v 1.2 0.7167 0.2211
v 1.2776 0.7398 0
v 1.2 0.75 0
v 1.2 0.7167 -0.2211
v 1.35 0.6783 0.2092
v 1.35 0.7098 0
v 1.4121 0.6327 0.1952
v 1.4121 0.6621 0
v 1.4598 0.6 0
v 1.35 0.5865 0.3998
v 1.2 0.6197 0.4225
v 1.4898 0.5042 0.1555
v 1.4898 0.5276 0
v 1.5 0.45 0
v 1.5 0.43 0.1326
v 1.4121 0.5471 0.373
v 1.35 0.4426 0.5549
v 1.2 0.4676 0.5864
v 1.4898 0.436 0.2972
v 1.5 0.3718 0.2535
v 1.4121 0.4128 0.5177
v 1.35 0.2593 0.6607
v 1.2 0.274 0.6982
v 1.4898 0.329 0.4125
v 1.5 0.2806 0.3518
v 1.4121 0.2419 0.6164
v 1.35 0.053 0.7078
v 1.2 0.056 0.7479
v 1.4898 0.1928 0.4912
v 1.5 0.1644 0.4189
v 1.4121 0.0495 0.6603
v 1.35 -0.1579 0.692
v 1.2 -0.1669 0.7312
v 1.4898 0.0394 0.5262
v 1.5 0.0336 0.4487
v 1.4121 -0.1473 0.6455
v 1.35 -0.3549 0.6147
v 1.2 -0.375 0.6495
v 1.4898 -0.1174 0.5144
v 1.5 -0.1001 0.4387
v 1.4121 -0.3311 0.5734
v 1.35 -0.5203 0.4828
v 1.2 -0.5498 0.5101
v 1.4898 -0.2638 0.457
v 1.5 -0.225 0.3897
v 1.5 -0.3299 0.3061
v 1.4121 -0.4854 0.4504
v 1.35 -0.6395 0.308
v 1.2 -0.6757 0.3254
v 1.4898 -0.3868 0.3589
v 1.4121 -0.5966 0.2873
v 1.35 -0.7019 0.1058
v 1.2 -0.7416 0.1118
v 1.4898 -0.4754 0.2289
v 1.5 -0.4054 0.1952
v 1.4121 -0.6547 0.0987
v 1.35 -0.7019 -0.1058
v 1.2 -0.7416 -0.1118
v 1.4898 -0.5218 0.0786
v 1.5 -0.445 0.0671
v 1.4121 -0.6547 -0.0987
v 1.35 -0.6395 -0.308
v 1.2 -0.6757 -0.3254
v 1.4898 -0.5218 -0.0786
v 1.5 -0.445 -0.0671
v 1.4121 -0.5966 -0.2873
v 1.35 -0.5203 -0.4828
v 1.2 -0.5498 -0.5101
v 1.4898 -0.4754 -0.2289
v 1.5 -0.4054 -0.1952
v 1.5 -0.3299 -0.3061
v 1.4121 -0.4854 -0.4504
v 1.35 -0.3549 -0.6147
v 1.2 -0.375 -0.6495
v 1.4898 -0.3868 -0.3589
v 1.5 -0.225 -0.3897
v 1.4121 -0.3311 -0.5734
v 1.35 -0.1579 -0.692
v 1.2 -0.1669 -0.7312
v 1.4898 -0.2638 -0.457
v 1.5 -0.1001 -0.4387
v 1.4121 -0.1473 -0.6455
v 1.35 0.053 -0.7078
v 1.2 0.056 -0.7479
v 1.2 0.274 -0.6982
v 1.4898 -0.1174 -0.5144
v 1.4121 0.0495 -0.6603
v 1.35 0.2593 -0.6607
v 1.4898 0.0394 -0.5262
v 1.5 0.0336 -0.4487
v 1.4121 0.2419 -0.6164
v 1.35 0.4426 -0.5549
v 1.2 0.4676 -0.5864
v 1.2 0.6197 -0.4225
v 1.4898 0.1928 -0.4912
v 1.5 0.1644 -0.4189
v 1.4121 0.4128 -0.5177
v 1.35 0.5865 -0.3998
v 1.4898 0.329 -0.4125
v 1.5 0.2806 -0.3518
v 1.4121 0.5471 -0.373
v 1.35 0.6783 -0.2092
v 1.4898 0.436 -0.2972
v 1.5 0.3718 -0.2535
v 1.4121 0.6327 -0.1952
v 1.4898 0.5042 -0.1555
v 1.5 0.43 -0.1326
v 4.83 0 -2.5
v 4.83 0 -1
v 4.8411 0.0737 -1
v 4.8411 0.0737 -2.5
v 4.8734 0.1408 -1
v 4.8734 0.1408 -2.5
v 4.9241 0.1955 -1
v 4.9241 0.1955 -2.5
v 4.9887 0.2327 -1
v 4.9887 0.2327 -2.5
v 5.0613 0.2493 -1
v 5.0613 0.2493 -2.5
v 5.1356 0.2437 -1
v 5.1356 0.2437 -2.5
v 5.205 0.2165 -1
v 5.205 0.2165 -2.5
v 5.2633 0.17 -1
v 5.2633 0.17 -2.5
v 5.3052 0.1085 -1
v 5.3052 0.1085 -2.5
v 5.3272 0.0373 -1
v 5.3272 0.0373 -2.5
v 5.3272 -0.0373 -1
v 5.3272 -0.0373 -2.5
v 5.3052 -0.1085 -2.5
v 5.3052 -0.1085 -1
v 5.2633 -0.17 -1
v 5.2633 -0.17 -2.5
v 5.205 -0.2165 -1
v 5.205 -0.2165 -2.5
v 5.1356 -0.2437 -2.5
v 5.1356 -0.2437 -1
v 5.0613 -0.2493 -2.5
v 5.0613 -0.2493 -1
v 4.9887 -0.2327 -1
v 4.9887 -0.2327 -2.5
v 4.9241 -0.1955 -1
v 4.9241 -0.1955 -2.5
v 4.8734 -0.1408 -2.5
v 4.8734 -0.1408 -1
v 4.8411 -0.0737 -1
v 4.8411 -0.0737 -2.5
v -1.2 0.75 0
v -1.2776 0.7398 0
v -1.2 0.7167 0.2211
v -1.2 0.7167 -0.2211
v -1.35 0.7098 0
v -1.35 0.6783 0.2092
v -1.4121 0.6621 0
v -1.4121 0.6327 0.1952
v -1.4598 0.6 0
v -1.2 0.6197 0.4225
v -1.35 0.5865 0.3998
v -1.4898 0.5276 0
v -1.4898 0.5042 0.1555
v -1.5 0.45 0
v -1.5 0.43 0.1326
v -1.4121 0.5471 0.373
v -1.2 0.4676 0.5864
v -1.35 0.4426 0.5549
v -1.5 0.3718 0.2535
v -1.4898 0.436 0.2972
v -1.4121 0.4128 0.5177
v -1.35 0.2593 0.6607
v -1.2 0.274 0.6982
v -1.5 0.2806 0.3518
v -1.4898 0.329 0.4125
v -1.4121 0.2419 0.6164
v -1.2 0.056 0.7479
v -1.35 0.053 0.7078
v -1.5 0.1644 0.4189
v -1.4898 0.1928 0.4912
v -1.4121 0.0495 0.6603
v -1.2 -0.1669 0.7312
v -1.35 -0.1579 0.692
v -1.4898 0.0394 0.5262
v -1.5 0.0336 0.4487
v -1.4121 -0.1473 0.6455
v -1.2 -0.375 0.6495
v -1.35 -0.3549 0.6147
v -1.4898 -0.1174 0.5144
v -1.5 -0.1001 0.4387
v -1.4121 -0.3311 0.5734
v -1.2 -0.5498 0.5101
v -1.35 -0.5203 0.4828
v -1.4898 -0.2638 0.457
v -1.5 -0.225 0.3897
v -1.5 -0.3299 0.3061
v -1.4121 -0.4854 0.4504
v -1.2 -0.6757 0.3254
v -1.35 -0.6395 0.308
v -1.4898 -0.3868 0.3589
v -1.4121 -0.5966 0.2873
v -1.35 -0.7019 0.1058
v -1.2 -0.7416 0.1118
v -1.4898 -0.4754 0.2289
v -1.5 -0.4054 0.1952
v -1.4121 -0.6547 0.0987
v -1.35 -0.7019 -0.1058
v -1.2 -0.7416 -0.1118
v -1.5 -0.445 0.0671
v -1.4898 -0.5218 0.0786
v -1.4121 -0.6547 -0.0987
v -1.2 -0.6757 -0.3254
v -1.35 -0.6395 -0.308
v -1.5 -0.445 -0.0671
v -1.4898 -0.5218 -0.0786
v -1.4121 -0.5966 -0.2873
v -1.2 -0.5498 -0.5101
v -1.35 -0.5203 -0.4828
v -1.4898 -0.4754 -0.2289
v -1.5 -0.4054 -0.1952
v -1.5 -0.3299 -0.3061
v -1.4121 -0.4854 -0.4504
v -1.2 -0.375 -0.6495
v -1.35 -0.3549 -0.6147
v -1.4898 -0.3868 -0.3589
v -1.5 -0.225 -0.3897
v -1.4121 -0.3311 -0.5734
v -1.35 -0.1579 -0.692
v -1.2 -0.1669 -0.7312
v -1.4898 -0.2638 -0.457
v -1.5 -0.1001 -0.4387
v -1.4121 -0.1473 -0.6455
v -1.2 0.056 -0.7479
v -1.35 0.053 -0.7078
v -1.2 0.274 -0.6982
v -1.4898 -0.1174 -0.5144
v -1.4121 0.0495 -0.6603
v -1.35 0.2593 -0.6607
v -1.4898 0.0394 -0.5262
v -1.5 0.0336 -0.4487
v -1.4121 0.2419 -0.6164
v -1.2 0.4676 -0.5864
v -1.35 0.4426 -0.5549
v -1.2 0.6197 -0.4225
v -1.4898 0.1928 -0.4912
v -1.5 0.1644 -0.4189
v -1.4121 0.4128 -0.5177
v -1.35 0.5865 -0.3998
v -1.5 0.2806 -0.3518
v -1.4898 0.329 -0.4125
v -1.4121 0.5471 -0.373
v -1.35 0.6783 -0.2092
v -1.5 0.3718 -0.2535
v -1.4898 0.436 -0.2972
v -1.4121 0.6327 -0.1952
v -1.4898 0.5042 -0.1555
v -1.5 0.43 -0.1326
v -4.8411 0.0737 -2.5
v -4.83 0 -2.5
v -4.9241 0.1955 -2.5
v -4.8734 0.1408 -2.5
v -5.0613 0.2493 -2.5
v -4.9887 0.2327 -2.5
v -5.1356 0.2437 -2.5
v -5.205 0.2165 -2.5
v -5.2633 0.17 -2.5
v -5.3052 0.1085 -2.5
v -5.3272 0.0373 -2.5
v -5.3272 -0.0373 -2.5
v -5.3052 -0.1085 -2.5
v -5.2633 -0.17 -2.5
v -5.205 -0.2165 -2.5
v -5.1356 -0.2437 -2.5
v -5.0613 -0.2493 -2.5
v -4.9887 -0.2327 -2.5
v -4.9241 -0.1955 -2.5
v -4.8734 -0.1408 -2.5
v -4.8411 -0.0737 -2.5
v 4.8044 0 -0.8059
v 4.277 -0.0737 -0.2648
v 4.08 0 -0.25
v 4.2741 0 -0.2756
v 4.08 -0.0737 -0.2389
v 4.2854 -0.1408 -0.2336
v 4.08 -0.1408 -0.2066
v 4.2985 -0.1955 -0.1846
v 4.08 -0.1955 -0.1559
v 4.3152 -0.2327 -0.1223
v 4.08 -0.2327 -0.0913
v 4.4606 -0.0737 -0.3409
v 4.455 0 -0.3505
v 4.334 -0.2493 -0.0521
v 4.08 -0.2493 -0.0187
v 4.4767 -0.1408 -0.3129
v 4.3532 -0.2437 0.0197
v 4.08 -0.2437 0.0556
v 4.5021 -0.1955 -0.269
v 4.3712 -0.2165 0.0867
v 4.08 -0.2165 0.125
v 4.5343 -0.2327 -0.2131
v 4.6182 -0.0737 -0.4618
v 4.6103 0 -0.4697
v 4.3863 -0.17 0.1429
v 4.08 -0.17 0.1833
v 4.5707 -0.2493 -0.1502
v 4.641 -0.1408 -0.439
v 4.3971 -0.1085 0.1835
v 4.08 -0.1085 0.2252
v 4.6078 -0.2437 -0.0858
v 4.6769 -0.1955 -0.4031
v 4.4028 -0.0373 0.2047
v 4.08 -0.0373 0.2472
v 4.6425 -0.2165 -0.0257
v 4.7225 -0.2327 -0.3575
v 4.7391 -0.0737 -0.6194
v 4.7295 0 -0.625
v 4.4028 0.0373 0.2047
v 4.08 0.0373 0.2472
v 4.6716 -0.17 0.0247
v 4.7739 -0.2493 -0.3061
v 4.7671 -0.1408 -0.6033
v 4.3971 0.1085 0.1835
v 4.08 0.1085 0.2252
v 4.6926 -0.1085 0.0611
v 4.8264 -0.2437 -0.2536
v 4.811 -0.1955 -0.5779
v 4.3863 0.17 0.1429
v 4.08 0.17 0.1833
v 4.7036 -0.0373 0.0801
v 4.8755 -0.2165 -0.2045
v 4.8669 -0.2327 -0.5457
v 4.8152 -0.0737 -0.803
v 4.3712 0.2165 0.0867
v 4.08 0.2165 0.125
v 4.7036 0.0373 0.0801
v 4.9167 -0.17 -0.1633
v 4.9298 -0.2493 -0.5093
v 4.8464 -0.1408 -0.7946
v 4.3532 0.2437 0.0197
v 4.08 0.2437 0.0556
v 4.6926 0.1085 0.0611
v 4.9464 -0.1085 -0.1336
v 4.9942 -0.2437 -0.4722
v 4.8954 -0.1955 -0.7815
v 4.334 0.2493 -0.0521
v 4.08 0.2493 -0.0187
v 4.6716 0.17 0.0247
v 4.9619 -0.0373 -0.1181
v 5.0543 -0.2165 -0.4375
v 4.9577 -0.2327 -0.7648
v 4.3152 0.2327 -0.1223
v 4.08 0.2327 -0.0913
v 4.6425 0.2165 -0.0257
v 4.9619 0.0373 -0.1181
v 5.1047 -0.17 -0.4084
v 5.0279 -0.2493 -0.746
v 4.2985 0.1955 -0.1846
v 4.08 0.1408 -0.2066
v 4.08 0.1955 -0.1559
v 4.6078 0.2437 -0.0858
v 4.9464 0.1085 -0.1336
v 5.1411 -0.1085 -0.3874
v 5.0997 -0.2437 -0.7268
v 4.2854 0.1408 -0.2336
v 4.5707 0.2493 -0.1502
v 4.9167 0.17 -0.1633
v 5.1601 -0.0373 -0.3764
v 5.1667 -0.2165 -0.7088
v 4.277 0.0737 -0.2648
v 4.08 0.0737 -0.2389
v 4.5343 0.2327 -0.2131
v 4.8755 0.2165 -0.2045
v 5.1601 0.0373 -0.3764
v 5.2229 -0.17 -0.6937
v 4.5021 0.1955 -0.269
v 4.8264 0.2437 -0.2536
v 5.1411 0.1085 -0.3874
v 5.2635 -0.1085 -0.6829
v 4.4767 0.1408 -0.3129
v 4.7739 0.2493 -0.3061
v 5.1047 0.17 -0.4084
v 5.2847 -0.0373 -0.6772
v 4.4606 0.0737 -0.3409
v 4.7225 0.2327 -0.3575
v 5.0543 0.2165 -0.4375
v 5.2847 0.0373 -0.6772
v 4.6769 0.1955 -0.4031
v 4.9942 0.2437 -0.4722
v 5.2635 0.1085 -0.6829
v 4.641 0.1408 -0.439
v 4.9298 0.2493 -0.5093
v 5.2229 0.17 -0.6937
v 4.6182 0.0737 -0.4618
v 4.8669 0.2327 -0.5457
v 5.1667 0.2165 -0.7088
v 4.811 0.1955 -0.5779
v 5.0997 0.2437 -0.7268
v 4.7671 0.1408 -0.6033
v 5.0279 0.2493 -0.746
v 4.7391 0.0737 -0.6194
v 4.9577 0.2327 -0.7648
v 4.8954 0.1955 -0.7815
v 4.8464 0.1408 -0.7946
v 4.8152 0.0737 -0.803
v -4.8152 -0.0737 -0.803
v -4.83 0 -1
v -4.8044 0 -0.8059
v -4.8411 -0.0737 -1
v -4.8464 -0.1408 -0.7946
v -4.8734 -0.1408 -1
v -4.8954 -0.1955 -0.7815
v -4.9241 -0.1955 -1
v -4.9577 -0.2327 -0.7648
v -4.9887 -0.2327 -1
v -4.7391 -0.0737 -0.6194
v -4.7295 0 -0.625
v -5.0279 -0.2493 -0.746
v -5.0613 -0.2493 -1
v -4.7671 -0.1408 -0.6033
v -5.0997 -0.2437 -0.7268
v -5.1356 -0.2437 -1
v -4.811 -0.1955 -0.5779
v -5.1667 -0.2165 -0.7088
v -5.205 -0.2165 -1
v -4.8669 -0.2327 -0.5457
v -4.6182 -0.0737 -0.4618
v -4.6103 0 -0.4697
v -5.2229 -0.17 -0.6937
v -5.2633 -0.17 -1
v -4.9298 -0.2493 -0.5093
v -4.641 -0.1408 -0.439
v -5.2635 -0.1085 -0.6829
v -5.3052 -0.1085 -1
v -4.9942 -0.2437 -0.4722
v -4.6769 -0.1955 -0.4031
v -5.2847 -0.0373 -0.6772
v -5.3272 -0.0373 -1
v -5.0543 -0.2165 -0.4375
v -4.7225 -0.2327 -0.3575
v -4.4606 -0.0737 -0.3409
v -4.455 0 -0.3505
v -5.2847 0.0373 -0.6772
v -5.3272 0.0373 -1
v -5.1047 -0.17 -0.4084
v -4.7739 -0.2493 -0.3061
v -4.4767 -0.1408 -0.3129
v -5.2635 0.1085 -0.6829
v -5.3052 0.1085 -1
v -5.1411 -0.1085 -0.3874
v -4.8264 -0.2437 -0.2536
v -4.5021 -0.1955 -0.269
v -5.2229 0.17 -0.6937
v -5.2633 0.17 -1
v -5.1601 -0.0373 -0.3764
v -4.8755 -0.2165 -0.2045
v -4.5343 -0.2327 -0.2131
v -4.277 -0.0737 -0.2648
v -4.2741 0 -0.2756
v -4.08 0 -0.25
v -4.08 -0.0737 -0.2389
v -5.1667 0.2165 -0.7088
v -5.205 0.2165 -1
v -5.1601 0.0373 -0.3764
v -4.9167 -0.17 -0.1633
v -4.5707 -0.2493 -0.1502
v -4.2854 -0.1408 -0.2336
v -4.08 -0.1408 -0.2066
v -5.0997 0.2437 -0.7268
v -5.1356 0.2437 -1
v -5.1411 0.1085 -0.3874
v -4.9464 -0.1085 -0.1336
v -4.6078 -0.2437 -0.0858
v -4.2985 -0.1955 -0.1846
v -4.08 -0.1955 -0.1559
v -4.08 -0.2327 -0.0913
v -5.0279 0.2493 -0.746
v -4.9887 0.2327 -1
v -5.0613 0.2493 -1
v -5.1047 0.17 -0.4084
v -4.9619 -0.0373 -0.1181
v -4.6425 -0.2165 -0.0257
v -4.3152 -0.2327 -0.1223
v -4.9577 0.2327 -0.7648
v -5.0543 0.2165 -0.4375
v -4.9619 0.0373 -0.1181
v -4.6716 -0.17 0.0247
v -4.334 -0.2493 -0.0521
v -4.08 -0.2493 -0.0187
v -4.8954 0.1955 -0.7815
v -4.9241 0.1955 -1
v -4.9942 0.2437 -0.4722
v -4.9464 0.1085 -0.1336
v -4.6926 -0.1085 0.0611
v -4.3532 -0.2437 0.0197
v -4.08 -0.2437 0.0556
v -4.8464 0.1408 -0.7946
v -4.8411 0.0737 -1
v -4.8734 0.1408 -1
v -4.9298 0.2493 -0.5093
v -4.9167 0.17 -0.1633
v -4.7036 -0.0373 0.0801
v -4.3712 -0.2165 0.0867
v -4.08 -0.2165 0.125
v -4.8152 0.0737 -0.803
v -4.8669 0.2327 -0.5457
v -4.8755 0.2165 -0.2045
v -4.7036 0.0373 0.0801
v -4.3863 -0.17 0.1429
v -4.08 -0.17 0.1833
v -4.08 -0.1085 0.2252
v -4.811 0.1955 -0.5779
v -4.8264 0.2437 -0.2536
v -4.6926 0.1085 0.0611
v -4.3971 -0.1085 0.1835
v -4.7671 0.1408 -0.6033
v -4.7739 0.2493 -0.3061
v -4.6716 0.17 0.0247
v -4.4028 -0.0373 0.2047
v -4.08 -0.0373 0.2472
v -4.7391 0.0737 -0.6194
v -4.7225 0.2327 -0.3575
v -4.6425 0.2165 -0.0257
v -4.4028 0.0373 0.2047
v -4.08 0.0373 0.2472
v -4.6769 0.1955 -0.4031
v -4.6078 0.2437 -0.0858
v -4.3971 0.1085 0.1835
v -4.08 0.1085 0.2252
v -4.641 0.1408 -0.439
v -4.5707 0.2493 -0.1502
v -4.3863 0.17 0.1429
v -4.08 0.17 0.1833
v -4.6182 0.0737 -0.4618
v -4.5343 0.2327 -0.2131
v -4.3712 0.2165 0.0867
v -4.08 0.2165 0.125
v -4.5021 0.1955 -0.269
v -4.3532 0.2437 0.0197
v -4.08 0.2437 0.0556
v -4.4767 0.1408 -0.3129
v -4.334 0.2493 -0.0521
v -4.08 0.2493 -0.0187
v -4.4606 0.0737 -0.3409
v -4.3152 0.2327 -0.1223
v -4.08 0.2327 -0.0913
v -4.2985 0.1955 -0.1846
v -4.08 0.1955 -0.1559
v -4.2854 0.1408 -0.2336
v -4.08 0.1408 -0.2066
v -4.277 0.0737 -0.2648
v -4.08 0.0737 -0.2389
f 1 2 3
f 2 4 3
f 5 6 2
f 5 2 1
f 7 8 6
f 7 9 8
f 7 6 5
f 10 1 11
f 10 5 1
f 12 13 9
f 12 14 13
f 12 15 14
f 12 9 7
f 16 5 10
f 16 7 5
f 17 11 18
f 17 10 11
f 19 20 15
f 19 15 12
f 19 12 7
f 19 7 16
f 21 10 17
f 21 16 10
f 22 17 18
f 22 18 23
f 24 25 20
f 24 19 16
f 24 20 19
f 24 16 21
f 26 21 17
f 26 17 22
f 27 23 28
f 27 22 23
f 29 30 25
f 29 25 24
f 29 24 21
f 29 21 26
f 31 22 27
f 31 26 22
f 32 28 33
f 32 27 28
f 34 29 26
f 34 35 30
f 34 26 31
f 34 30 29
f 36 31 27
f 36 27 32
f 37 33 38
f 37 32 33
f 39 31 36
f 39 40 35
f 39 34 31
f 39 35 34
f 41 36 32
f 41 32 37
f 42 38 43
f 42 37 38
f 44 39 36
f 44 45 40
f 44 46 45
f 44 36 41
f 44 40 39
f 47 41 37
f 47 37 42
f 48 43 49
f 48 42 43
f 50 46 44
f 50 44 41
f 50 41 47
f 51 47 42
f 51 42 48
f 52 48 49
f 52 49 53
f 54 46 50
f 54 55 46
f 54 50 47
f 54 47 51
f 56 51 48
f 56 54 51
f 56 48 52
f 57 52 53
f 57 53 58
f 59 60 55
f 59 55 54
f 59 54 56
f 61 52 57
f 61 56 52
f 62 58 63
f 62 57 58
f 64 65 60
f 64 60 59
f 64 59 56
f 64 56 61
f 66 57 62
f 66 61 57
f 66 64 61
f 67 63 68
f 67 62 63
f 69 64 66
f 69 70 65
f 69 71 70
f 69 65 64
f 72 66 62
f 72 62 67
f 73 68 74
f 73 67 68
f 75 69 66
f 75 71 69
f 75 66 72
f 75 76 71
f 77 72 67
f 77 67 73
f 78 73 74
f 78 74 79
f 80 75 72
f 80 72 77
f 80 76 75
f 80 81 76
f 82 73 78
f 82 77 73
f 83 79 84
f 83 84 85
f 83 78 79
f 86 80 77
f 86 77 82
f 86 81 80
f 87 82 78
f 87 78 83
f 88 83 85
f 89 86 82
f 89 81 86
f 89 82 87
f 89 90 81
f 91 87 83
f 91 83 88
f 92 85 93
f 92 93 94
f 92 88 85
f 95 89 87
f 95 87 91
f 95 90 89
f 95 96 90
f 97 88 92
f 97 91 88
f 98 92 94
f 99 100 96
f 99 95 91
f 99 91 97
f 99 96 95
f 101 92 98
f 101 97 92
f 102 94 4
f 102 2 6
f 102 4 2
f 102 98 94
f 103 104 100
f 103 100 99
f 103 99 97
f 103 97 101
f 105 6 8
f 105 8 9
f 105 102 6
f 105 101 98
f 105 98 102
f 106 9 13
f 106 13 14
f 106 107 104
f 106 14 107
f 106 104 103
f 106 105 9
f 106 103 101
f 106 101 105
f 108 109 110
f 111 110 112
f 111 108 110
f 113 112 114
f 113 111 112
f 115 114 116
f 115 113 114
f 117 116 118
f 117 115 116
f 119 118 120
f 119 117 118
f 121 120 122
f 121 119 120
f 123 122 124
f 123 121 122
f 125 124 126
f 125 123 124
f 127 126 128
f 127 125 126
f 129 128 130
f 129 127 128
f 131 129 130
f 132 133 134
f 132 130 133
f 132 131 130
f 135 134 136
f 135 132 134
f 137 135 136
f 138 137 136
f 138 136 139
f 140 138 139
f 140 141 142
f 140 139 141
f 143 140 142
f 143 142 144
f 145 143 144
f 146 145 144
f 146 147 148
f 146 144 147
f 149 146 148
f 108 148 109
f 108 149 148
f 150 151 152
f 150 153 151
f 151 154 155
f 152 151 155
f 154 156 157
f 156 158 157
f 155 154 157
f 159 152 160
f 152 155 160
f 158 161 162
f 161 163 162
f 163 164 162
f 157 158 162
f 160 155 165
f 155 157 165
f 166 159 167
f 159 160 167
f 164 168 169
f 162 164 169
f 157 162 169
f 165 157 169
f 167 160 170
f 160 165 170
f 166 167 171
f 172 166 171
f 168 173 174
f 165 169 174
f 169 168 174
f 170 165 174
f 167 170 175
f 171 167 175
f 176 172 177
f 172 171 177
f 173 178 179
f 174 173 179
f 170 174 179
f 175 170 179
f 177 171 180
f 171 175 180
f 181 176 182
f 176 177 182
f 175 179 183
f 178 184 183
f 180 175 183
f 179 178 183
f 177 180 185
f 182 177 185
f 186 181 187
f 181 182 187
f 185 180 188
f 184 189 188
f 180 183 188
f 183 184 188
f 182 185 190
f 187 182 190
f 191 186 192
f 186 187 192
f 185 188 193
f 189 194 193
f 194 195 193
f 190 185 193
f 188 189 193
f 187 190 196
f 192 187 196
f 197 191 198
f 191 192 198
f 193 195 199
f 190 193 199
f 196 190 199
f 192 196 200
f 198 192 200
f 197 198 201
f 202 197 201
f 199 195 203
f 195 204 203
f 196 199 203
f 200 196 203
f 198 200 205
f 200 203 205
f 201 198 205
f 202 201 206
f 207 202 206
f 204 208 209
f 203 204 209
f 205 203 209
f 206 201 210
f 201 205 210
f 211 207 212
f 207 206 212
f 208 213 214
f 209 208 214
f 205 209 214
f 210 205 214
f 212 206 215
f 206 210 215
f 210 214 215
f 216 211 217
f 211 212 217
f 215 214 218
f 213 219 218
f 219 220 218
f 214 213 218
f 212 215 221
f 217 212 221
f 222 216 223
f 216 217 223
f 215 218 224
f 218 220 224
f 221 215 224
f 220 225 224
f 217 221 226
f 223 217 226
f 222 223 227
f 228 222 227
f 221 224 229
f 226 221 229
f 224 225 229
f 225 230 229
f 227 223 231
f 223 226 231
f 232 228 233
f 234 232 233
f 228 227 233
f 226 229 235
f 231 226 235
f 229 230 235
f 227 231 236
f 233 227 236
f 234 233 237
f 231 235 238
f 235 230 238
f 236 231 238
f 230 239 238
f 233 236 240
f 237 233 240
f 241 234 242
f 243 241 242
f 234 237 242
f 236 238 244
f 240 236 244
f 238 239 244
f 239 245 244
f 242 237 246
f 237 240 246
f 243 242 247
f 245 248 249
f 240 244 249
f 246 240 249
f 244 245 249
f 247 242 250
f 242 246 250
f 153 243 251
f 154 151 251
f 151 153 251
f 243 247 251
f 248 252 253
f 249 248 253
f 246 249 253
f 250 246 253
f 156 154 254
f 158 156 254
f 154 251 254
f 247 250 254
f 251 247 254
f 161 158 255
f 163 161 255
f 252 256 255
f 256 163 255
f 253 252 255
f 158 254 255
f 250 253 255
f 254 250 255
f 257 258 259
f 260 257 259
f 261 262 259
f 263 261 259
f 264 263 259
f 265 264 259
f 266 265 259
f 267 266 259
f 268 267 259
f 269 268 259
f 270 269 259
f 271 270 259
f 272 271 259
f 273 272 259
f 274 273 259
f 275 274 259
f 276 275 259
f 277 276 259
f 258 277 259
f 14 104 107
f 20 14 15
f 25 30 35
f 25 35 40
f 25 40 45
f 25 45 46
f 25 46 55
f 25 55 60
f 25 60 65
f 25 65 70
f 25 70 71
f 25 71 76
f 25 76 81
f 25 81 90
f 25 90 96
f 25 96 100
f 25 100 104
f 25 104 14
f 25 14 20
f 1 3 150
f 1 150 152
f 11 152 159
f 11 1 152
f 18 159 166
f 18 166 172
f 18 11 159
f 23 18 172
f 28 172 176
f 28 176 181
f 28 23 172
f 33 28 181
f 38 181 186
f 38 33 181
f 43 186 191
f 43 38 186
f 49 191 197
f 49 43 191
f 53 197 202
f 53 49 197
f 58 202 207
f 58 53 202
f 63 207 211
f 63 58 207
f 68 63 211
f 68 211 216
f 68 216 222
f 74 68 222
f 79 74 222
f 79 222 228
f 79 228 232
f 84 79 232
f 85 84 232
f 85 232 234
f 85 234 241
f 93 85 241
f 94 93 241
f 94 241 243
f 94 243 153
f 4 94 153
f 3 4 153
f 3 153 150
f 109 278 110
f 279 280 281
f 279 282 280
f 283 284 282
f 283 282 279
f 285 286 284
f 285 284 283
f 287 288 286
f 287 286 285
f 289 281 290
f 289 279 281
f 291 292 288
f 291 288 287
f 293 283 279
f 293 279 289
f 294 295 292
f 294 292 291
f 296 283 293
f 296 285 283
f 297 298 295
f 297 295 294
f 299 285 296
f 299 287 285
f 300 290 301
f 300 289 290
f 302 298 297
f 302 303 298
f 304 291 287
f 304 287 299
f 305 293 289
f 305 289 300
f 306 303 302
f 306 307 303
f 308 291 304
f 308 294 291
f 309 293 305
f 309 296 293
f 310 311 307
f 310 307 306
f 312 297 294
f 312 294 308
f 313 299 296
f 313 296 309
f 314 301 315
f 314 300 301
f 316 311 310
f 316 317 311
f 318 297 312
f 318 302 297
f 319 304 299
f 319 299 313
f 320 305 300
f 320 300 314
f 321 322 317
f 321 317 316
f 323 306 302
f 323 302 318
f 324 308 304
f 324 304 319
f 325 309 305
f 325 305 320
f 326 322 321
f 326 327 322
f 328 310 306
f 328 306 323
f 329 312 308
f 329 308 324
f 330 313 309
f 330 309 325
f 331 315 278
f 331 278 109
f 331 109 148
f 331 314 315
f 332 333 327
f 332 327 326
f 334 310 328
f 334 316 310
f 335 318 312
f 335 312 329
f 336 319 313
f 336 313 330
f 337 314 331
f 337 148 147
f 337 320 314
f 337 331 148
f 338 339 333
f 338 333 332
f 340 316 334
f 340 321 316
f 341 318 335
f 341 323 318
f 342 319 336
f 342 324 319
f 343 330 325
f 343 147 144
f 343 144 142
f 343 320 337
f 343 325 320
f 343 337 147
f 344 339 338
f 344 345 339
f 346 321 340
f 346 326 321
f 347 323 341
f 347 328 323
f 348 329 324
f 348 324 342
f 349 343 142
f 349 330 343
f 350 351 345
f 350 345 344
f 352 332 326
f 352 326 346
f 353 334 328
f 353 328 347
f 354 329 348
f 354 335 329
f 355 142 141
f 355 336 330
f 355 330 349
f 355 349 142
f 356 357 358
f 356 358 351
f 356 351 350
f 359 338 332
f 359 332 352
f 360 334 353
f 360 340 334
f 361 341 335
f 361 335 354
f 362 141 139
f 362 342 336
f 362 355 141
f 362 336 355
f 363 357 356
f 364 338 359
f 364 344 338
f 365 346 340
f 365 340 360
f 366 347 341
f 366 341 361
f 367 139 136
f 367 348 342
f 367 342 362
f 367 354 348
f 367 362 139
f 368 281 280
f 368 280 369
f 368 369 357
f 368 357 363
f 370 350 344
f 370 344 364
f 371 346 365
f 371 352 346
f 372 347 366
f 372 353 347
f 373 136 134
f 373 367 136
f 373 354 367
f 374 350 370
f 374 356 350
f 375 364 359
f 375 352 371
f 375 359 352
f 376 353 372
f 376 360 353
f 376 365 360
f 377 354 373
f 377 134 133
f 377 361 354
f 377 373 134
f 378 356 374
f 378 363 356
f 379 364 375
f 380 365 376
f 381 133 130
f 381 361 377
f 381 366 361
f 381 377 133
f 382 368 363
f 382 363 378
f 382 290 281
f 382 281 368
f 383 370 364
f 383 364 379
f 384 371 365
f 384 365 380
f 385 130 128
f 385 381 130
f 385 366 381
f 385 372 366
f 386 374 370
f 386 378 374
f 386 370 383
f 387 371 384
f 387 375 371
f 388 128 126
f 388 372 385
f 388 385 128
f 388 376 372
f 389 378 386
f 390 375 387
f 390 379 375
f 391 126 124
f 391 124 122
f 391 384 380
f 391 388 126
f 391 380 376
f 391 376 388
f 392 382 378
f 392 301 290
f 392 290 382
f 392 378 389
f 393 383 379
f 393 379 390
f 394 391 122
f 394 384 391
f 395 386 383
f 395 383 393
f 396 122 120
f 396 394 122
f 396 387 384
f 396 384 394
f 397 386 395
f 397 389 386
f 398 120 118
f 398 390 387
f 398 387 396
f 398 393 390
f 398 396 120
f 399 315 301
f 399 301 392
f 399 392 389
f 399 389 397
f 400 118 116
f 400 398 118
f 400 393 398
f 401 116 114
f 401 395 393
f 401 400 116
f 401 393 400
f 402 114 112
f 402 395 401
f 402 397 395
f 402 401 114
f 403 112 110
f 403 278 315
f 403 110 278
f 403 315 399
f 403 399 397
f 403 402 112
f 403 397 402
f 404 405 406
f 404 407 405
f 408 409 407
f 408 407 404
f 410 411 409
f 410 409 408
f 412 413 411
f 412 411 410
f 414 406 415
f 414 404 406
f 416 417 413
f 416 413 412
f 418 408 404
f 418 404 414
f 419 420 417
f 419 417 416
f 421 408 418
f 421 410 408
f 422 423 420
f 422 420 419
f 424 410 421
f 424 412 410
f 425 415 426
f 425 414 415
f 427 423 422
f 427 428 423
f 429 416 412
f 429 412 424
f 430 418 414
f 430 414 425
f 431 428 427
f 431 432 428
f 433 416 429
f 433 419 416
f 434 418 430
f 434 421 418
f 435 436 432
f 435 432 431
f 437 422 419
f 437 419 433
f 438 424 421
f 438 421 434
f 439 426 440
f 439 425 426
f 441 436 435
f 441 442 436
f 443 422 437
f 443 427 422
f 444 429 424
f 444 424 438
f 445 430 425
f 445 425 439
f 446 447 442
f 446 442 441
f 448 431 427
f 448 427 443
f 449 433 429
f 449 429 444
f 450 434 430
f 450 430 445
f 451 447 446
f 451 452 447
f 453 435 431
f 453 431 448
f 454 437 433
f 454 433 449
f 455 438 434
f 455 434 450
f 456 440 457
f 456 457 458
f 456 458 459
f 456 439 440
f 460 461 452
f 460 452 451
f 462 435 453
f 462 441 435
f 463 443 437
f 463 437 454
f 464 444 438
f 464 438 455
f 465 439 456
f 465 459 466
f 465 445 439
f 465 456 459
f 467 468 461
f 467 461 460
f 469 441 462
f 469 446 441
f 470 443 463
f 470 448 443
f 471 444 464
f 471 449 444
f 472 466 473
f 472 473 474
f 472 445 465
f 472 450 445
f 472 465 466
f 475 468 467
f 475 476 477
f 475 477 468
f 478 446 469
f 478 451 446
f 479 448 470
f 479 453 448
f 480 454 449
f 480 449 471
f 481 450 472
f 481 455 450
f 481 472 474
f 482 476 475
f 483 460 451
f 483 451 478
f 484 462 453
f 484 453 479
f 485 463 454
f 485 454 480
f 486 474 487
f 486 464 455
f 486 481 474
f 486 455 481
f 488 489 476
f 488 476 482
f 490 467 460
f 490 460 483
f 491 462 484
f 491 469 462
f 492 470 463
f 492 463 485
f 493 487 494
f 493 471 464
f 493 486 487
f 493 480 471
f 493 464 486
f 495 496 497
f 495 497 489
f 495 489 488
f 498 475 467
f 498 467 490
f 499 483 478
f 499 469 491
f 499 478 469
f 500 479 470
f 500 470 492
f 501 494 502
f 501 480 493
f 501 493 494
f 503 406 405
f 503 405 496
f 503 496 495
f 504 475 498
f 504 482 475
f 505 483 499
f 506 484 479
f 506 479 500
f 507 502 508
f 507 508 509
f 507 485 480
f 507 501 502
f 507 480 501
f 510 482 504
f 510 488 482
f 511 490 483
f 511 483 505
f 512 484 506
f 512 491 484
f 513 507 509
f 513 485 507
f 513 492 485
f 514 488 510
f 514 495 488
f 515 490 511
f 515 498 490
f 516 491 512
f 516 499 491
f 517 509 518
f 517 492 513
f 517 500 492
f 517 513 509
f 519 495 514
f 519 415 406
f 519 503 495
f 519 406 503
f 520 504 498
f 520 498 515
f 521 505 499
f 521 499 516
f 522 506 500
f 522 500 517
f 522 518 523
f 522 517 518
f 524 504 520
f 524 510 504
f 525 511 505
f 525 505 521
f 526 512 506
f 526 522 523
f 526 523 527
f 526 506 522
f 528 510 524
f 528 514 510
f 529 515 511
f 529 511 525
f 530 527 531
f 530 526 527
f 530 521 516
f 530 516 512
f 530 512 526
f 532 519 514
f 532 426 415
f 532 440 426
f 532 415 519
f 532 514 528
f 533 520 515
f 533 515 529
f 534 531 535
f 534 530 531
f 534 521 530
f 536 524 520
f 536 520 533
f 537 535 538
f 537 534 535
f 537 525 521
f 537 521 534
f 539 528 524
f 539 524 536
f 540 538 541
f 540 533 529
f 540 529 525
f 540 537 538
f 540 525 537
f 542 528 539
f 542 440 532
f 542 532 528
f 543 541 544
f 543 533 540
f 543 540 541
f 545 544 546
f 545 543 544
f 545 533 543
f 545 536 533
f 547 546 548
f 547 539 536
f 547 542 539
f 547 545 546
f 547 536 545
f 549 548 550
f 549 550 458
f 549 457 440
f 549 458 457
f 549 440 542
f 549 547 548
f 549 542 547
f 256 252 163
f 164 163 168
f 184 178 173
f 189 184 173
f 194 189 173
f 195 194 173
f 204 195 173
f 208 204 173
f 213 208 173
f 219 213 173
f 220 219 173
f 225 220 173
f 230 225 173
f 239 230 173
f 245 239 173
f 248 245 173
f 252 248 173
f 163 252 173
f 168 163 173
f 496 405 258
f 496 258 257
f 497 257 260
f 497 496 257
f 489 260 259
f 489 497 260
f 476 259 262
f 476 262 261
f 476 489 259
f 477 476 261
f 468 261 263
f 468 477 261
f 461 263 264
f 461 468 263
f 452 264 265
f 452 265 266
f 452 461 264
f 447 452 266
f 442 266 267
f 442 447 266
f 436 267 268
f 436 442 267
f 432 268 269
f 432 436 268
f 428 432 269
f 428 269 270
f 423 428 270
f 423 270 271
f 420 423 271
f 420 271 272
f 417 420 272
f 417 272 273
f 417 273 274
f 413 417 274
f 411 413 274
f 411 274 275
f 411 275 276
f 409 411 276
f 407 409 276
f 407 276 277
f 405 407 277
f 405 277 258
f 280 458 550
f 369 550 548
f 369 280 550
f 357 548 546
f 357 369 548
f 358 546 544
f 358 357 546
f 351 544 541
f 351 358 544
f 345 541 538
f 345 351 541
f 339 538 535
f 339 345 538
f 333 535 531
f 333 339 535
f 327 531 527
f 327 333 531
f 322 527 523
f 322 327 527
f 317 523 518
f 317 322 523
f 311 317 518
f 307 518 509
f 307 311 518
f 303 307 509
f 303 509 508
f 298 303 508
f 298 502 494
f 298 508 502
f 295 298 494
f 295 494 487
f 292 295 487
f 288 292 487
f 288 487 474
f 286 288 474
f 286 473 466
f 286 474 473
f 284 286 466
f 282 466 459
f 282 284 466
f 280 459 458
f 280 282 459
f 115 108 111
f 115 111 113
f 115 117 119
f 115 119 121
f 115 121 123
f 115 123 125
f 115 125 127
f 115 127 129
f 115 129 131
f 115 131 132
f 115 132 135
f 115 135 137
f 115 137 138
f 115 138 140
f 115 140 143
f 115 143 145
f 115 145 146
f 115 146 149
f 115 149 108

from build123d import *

# Parameters (mm, degrees)
F0_R     = 0.75
F1_DEPTH = 1.5
F2_R     = 0.3
F5_R     = 0.25


with BuildPart() as f1:
    # F0 (on Right) → F1 (new body, symmetric)
    with BuildSketch(Plane.YZ):
        Circle(F0_R)
    extrude(amount=F1_DEPTH, both=True)

    # F2
    f2_edges = [f1.edges().sort_by_distance(p)[0] for p in [
        (-1.5, -0.75, 0),
        (1.5, -0.75, 0),
    ]]
    fillet(f2_edges, radius=F2_R)


with BuildPart() as f6:
    # F6: sweep along a path in F3
    with BuildLine(Plane.XZ) as f6_path:
        Line((-5.08, -2.5), (-5.08, -1))
        ThreePointArc((-5.08, -1), (-4.7871067812, -0.2928932188), (-4.08, 0))
        Line((-4.08, 0), (4.08, 0))
        ThreePointArc((4.08, 0), (4.7871067812, -0.2928932188), (5.08, -1))
        Line((5.08, -1), (5.08, -2.5))
    # F5 (on line) → F6 (sweep)
    with BuildSketch(Plane.XY.offset(-2.5)):
        with Locations((-5.08, 0)):
            Circle(F5_R)
    sweep(path=f6_path.line)


solid = Compound([f1.part, f6.part])
